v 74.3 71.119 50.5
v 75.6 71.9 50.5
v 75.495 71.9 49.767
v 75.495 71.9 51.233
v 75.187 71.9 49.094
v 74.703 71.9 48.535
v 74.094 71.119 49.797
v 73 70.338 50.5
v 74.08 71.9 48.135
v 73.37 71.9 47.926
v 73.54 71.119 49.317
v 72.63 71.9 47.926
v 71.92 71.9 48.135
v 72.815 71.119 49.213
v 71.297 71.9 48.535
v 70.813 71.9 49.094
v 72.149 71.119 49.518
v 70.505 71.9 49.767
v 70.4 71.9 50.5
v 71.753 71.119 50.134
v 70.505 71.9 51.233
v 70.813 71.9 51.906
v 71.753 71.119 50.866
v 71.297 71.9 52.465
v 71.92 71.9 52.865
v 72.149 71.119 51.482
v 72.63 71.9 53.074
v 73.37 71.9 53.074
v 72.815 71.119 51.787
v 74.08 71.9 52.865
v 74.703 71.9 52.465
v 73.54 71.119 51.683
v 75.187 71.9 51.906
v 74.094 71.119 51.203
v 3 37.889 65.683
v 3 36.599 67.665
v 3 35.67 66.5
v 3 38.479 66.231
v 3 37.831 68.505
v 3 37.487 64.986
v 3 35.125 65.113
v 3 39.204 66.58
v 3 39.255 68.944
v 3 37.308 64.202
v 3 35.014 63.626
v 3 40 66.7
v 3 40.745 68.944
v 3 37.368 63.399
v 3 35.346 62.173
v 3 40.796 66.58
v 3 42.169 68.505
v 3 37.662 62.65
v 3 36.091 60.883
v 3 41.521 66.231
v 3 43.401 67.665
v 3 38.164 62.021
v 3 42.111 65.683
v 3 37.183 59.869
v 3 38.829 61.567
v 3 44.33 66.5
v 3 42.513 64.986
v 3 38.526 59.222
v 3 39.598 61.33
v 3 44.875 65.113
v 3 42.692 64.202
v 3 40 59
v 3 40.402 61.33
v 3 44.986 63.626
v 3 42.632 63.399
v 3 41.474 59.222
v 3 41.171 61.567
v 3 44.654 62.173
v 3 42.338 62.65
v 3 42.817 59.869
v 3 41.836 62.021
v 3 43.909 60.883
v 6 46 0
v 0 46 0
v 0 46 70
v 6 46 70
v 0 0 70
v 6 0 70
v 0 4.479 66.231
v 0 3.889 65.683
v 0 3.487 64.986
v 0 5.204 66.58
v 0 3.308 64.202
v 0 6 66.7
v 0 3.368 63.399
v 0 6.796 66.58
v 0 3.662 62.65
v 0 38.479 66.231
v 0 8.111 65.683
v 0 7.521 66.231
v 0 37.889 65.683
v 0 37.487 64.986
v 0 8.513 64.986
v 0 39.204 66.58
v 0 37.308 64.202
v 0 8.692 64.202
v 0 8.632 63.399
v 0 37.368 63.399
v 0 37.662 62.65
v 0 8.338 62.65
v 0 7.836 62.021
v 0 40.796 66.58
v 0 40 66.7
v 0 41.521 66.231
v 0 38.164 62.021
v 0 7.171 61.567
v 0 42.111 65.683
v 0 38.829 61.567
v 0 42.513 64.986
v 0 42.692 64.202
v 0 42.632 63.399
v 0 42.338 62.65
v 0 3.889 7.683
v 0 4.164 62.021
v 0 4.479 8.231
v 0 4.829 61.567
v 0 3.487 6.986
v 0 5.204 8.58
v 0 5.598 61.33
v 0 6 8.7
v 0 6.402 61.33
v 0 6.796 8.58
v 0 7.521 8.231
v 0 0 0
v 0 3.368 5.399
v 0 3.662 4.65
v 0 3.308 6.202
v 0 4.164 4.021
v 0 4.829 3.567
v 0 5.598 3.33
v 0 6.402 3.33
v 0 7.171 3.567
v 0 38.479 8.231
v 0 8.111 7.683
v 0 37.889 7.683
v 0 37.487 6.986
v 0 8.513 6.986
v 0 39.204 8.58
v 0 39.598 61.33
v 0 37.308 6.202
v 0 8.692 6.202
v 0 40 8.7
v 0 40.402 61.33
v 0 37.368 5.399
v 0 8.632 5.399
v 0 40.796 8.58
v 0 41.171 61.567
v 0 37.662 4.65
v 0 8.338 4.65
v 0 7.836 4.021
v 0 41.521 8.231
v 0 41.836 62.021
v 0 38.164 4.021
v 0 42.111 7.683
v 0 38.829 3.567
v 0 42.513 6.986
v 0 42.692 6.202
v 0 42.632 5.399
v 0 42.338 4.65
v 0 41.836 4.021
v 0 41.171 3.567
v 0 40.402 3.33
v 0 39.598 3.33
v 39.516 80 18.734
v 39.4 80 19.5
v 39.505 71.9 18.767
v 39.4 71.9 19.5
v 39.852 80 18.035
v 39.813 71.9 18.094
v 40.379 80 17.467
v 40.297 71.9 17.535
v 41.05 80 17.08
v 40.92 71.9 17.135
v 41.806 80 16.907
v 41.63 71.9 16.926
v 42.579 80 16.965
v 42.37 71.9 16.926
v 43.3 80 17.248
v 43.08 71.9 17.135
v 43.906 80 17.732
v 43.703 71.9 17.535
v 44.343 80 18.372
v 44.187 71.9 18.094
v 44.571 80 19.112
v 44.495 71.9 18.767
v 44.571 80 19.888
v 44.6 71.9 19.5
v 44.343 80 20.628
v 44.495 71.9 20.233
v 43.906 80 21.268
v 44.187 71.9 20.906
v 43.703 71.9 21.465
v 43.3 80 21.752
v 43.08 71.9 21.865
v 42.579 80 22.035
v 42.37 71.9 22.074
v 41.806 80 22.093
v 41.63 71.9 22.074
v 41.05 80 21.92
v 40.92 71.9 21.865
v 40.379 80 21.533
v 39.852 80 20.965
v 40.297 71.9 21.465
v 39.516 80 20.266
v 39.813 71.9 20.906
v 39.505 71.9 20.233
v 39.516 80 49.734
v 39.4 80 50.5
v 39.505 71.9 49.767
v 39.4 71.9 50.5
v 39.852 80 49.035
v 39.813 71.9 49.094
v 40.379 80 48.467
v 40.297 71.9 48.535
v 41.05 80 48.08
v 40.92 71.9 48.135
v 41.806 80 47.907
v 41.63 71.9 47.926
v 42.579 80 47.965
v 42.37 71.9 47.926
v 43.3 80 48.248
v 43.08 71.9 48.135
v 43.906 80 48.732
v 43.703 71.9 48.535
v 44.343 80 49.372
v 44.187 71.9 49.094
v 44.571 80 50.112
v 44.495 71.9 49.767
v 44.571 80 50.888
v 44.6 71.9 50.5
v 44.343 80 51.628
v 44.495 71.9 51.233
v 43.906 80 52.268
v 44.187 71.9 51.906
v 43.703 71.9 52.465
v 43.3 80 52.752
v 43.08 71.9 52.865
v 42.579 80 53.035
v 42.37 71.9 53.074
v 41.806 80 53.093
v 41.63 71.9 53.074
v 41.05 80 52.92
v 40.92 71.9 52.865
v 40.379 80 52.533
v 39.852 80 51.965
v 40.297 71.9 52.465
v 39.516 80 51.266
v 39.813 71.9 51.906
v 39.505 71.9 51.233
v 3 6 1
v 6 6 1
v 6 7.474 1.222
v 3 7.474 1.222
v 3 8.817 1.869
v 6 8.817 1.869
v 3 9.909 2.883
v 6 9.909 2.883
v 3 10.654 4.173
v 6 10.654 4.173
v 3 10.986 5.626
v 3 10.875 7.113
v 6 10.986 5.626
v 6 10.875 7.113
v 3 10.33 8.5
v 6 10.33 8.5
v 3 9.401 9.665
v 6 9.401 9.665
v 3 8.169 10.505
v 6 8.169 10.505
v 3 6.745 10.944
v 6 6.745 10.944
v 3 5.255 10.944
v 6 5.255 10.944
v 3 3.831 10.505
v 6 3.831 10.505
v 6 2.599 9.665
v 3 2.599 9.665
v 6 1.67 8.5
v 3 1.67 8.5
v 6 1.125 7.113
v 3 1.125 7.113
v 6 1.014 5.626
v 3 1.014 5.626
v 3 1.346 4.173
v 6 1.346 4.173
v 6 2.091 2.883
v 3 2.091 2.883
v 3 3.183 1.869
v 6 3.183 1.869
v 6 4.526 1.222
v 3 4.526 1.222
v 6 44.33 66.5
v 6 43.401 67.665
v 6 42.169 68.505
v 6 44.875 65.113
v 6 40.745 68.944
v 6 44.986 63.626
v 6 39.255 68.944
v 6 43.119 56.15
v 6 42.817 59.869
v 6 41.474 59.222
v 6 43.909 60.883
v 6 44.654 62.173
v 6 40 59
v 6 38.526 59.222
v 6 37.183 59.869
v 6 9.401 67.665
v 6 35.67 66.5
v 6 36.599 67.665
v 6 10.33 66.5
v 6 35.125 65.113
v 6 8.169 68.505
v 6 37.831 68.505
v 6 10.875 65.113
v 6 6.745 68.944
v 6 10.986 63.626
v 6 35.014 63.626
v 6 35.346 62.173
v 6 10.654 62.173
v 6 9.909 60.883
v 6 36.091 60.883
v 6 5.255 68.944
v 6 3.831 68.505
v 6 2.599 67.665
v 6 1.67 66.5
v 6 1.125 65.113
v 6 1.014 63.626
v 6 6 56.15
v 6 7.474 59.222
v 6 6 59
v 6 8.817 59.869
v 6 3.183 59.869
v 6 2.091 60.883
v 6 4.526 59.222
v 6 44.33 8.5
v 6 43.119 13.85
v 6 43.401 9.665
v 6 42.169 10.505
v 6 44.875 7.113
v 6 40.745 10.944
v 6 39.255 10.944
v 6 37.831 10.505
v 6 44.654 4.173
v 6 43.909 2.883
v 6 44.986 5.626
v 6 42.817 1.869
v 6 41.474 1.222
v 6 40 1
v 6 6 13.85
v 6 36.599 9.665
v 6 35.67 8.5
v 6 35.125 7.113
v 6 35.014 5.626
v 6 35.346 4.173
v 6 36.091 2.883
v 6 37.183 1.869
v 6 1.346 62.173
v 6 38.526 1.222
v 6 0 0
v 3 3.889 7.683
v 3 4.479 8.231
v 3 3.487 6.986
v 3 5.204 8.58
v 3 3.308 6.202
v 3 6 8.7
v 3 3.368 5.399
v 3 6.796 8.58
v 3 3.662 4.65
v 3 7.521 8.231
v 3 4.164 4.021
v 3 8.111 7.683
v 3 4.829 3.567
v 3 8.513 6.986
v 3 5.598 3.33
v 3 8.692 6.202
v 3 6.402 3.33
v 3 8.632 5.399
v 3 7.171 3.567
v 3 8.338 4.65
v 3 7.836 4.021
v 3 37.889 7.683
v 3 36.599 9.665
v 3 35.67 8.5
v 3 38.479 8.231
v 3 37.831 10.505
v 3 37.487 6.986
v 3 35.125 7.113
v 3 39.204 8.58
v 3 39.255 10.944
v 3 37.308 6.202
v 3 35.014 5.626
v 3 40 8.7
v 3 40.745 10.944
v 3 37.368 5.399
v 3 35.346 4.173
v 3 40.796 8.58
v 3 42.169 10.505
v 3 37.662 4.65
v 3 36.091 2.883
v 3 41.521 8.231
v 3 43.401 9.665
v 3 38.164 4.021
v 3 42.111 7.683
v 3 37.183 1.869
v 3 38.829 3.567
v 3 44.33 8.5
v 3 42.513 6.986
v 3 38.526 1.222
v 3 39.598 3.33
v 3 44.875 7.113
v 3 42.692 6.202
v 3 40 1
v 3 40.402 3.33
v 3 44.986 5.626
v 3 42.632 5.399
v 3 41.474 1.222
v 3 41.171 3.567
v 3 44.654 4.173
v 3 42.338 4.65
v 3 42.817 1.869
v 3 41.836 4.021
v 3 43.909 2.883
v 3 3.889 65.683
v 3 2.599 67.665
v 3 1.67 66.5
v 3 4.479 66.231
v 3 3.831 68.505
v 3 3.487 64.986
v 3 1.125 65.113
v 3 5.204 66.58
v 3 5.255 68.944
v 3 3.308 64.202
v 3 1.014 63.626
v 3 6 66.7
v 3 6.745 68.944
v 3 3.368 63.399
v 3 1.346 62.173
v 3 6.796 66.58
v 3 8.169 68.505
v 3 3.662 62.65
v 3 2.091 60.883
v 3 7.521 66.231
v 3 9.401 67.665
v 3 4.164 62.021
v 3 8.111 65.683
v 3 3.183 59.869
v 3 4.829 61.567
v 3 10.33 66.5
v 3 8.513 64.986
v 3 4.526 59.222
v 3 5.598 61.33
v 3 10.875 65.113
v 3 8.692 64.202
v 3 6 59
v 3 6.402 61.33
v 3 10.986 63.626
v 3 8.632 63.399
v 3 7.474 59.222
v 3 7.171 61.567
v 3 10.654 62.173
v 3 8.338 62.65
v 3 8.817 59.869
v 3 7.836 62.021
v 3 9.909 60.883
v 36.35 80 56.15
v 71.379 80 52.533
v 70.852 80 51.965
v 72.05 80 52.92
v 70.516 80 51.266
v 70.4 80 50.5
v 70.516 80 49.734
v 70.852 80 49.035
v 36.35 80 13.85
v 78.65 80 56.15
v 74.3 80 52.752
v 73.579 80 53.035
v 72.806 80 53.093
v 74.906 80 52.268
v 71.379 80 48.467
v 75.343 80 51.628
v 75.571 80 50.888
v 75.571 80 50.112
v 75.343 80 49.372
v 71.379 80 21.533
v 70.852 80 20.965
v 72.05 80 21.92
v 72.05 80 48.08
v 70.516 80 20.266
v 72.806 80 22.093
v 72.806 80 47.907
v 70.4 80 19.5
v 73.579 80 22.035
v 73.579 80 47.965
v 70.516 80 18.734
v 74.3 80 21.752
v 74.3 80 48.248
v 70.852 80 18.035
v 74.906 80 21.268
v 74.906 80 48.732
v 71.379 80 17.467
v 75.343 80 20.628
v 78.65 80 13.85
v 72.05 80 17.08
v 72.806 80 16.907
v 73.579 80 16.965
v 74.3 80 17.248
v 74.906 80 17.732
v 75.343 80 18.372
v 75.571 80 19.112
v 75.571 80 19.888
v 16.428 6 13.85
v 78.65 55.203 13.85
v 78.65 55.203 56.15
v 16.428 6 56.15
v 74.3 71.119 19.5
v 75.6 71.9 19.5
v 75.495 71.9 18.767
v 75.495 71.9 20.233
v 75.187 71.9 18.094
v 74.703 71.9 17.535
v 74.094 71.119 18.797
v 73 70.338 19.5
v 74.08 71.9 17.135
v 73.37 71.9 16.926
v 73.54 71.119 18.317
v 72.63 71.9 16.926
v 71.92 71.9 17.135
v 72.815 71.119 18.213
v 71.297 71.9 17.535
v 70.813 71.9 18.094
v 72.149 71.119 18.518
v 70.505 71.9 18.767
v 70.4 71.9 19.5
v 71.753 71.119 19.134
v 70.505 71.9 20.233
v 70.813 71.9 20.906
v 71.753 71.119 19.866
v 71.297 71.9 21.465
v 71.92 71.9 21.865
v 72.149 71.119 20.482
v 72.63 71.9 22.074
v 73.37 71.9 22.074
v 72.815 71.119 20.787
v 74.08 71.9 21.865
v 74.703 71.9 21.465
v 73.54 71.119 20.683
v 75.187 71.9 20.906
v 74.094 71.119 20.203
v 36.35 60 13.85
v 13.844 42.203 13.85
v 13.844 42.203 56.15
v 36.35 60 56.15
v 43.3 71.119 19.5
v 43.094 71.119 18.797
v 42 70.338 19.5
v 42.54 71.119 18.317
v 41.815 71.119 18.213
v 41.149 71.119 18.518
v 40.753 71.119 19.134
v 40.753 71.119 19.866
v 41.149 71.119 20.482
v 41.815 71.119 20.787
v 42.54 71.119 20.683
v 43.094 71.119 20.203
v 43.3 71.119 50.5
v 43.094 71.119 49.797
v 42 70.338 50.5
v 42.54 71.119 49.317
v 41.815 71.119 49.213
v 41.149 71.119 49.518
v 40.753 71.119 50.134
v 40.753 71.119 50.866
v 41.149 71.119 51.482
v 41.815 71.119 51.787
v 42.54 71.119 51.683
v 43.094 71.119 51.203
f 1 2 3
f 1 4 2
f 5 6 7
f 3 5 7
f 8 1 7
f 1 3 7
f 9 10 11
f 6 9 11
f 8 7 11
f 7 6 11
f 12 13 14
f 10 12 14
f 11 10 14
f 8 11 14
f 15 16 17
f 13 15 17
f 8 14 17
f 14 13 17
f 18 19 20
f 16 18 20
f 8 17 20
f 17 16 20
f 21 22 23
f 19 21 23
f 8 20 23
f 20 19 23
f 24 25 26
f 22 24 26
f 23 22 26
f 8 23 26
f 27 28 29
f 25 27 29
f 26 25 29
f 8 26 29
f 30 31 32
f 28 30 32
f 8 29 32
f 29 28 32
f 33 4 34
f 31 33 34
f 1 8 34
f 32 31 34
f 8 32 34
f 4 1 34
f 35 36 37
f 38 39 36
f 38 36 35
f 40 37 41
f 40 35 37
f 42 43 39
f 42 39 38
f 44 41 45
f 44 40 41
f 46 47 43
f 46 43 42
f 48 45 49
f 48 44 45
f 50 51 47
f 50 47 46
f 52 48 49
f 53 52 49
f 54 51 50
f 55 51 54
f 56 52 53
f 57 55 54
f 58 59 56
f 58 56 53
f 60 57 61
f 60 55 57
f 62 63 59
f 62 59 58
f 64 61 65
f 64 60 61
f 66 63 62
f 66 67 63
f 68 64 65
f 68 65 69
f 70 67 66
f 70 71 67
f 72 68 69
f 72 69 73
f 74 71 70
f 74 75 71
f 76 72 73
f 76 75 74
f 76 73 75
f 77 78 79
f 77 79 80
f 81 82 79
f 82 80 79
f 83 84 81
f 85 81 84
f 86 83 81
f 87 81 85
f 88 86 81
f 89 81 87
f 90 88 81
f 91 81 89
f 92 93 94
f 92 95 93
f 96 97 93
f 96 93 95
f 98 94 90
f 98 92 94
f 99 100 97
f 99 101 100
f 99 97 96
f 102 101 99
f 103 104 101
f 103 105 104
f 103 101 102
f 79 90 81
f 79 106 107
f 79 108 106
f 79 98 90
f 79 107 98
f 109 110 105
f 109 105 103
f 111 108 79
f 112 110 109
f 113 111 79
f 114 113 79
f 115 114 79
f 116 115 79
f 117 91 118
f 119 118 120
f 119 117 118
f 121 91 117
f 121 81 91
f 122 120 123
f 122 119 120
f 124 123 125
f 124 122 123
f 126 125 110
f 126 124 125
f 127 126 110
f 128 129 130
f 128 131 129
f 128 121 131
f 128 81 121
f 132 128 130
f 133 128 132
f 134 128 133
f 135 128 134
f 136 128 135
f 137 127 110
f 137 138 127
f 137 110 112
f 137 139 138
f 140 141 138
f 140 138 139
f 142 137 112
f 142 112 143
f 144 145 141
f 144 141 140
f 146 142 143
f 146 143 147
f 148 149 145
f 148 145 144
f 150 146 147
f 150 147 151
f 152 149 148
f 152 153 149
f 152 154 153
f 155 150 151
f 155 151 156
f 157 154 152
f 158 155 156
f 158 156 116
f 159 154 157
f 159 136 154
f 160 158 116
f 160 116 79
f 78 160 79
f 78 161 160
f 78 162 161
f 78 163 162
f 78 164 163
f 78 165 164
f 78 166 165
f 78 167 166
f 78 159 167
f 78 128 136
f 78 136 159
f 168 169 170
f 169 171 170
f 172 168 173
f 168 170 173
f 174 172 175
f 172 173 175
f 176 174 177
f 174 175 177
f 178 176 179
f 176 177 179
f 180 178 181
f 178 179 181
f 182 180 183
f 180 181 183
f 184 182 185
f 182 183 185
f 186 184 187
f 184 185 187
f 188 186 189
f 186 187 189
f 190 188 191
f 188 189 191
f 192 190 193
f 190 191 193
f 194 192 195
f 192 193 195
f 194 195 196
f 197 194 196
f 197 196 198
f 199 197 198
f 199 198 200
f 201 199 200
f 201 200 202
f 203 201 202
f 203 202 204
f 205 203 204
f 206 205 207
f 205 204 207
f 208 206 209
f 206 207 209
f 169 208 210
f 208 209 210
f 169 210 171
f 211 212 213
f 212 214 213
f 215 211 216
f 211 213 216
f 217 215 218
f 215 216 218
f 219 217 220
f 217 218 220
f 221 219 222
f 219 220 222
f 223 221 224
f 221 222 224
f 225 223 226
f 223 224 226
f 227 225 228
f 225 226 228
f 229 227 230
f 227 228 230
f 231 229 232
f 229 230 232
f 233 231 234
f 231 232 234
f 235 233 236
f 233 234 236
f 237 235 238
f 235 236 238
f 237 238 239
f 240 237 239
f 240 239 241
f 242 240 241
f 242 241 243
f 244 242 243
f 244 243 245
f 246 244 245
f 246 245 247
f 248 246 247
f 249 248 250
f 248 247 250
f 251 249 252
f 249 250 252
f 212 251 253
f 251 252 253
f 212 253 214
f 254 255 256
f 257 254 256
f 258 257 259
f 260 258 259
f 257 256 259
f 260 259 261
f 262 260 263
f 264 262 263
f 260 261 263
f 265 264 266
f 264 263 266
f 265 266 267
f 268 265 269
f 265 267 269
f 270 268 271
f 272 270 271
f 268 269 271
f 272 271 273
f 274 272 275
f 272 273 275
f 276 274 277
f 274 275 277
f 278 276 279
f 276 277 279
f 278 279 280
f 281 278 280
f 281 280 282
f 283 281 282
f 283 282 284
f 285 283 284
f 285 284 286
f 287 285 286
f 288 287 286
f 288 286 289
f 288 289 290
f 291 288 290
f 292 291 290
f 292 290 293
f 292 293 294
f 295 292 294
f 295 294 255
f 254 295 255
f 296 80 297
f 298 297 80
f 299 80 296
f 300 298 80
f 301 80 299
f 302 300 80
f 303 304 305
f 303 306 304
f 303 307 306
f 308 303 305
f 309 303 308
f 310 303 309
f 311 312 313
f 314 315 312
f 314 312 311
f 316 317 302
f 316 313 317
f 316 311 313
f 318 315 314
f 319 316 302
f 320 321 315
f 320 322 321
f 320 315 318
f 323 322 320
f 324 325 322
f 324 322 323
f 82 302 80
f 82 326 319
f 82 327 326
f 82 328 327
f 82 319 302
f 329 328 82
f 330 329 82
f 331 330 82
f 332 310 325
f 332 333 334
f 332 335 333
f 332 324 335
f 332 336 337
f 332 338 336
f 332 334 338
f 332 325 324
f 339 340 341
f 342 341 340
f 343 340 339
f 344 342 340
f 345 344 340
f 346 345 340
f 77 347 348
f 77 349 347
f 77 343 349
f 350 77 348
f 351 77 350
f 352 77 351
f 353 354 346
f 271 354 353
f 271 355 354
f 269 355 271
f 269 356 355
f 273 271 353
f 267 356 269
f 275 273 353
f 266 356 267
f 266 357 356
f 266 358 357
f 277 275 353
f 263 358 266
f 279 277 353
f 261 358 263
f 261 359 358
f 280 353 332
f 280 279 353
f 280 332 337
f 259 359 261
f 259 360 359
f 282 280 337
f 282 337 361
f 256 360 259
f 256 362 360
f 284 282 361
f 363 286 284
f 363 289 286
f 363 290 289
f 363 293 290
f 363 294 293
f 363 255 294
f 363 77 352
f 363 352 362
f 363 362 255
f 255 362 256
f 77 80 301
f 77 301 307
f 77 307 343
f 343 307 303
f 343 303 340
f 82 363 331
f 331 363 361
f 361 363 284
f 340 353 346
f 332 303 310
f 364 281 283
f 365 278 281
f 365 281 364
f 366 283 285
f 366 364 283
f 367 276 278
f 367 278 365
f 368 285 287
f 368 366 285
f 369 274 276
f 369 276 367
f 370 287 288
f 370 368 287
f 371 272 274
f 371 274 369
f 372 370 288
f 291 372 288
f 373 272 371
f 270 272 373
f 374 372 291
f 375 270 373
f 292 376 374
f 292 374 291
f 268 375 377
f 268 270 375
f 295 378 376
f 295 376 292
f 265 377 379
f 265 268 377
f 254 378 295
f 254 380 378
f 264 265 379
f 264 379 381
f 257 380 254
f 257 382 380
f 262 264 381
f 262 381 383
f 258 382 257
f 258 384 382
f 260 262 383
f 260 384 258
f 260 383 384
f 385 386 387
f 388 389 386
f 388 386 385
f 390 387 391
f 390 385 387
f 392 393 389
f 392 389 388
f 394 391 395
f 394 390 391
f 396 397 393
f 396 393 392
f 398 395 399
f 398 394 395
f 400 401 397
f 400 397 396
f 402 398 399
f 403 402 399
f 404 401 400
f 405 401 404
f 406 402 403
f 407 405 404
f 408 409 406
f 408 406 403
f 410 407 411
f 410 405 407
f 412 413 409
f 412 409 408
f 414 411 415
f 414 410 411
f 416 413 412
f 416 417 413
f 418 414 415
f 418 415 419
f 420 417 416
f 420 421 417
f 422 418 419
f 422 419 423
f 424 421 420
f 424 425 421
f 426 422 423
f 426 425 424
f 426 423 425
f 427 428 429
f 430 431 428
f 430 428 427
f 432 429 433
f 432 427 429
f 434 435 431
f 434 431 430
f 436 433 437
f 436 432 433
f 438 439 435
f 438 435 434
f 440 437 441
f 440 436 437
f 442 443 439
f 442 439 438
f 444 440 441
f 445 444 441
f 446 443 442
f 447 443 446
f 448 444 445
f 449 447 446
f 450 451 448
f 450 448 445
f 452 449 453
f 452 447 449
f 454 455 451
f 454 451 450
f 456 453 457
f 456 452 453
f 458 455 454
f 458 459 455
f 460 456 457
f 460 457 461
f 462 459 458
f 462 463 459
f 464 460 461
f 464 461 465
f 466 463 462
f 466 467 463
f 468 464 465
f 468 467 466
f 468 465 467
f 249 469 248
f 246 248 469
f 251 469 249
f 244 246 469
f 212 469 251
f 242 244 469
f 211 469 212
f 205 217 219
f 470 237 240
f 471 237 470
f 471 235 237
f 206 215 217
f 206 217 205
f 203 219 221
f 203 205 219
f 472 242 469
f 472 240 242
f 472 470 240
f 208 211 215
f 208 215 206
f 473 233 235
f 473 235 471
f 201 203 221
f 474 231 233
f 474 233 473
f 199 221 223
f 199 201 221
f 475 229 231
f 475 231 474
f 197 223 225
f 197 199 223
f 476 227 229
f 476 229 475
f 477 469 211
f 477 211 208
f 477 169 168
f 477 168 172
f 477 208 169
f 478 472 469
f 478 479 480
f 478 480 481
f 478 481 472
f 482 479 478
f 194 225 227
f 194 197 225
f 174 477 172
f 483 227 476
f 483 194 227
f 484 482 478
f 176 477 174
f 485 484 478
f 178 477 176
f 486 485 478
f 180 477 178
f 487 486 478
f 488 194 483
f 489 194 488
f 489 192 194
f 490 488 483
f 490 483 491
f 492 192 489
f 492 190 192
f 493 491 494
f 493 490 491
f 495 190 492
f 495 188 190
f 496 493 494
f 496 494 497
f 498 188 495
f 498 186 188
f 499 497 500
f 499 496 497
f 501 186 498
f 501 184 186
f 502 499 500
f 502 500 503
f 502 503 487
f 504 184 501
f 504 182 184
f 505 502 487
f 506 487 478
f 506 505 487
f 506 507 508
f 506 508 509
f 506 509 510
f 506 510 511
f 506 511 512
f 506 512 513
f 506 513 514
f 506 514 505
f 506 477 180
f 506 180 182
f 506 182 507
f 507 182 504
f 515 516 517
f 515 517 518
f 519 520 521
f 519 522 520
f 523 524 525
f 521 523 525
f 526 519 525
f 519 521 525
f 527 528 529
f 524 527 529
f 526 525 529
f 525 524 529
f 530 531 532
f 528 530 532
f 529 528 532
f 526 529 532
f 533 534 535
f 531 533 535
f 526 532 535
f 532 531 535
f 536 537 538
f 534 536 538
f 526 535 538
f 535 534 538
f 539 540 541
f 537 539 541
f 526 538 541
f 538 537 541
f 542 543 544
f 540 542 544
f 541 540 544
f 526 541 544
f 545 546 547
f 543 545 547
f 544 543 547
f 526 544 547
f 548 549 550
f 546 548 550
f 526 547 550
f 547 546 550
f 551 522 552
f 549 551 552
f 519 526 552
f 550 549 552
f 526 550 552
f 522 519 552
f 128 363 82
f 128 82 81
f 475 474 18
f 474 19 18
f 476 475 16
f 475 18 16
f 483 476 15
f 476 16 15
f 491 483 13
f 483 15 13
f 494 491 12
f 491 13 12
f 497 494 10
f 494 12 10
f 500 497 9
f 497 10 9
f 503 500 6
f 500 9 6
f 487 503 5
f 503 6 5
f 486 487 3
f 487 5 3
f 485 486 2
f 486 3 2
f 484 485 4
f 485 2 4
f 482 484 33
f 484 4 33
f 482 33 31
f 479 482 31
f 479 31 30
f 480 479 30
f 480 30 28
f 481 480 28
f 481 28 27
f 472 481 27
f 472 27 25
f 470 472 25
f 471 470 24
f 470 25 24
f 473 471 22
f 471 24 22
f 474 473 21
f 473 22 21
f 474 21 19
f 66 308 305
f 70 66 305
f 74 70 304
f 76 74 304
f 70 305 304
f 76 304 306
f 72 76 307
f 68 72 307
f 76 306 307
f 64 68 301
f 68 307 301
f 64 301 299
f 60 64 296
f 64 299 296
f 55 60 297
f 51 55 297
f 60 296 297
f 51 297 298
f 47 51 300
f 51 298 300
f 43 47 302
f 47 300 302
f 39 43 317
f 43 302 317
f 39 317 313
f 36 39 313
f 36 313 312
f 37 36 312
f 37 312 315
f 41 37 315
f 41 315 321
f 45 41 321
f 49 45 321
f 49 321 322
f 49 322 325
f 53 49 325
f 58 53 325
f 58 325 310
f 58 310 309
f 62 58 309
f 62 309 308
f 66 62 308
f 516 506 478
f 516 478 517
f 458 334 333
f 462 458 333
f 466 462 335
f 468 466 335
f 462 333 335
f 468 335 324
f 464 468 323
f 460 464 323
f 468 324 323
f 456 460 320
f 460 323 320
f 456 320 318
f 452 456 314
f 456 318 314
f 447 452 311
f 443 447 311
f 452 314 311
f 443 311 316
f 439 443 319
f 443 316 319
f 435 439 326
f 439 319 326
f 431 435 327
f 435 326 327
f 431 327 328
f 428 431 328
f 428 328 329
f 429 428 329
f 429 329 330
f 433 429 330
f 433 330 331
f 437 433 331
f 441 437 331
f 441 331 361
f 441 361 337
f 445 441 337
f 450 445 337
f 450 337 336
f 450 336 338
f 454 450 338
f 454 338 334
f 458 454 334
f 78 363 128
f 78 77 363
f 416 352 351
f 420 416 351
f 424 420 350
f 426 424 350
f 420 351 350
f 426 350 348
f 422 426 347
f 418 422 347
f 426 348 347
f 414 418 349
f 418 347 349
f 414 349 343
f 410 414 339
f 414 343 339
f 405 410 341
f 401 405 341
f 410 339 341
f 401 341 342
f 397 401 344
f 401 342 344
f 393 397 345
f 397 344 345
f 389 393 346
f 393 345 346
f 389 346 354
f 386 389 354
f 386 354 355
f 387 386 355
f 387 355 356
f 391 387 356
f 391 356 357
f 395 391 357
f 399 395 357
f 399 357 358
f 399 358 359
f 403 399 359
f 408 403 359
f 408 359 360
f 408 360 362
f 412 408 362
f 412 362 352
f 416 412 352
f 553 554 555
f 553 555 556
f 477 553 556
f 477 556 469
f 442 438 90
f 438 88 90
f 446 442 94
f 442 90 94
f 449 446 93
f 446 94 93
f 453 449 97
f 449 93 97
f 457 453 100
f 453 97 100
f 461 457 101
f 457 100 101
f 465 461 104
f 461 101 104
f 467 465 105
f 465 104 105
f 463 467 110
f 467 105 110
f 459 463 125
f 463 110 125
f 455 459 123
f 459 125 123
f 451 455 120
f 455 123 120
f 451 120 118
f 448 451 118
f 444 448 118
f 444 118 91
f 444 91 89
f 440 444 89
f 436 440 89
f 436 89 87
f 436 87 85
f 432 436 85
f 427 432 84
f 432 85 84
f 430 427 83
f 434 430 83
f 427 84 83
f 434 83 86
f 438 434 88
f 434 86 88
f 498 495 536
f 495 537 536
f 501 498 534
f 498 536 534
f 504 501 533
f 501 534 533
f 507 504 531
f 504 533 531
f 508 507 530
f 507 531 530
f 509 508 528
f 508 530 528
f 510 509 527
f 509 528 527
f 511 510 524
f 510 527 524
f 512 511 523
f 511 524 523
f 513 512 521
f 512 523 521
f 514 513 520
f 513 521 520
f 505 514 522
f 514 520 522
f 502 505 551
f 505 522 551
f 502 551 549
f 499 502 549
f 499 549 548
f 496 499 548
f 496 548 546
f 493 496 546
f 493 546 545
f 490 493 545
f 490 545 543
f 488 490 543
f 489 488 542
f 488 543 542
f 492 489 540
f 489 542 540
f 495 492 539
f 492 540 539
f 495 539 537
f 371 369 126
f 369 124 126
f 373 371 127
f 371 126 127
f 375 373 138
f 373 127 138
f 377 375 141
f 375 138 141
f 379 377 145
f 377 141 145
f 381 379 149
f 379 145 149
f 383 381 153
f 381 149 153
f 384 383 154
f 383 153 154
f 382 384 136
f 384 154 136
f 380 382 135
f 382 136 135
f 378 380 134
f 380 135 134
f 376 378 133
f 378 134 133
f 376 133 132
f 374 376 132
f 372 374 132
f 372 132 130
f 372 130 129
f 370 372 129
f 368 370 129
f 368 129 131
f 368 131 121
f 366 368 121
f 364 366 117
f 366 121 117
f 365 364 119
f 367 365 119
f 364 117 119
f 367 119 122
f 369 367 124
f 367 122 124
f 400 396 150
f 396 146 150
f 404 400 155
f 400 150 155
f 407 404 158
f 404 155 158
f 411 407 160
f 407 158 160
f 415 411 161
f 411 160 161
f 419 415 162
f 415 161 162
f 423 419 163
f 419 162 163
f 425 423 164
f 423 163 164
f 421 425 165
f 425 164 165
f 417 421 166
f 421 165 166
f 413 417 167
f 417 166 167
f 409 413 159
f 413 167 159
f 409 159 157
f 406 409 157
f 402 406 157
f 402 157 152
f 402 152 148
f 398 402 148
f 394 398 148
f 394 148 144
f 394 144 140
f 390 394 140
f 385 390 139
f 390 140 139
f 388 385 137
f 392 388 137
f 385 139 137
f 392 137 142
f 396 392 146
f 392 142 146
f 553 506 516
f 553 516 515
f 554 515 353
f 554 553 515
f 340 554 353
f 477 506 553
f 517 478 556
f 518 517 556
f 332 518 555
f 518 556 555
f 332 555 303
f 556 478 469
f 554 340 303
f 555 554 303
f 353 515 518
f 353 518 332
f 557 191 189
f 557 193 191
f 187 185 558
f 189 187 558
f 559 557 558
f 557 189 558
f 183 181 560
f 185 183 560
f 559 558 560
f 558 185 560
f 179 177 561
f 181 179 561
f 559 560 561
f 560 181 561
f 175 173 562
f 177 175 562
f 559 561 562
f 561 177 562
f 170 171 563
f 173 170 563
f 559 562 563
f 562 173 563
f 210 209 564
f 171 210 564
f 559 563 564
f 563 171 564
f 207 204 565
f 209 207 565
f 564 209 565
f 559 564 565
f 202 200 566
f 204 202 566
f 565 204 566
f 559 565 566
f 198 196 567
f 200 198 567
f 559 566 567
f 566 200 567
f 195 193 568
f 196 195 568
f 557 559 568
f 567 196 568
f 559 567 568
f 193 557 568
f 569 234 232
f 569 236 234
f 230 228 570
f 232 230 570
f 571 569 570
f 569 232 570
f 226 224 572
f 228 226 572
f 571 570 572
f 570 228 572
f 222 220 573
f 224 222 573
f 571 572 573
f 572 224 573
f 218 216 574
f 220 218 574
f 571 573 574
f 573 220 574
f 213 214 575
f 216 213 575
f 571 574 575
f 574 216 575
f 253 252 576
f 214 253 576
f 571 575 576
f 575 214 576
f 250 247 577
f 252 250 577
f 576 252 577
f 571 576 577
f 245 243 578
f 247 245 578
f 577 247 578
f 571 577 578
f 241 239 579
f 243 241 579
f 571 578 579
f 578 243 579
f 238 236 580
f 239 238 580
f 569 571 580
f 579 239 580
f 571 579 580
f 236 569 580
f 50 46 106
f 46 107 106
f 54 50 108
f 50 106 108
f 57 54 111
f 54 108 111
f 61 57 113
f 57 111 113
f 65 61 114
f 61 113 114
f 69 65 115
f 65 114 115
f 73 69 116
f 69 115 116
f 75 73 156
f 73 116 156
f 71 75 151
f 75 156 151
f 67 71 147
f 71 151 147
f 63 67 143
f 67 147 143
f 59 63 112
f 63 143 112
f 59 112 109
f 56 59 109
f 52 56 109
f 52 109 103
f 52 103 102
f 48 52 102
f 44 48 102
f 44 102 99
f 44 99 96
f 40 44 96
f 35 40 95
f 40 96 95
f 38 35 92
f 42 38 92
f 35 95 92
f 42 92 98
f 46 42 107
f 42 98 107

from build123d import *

# Parameters (mm, degrees)
ESTRUSIONE_ESTRUSIONE1_DEPTH                         = 70
TAGLIO_ESTRUSIONE2_DEPTH                             = 133.233968783
TAGLIO_ESTRUSIONE2_DEPTH_BACK                        = 13.85
TAGLIO_ESTRUSIONE3_DEPTH                             = 13.85
FORO_LAMATO_PER_BULLONE_M12_A_TESTA_ESAG_D           = 5.4
FORO_LAMATO_PER_BULLONE_M12_A_TESTA_ESAG_DEPTH       = 18.1
FORO_LAMATO_PER_BULLONE_M12_A_TESTA_ESAG_CBORE_D     = 10
FORO_LAMATO_PER_BULLONE_M12_A_TESTA_ESAG_CBORE_DEPTH = 3
FORO_LAMATO_PER_BULLONE_M12_A_TESTA_ESAG_TIP         = 1.622323671
SMUSSO1_SIZE                                         = 10
SMUSSO1_SIZE2                                        = 7.11916601
FORO_PER_VITE_M4_1_D                                 = 5.2
FORO_PER_VITE_M4_1_DEPTH                             = 8.1
FORO_PER_VITE_M4_1_TIP                               = 1.562237609


with BuildPart() as part:
    # Schizzo1 → Estrusione-Estrusione1 (new body)
    with BuildSketch(Plane.XY):
        Polygon((0, 0), (0, 46), (6, 46), (6, 36), (36.35, 60), (36.35, 80), (78.65, 80), (78.65, 55.203294303), (16.42833408, 6), (6, 6), (6, 0), align=None)
    extrude(amount=ESTRUSIONE_ESTRUSIONE1_DEPTH)

    # Schizzo3 → Taglio-Estrusione2 (cut, two sides: drawn at the far end of the back side and taken through both)
    with BuildSketch(Plane.XY.offset(70).offset(-TAGLIO_ESTRUSIONE2_DEPTH_BACK)):
        Polygon((6, 6), (6, 36), (36.35, 60), (36.35, 80), (78.65, 80), (78.65, 55.203294303), (16.42833408, 6), align=None)
    extrude(amount=TAGLIO_ESTRUSIONE2_DEPTH + TAGLIO_ESTRUSIONE2_DEPTH_BACK, mode=Mode.SUBTRACT)

    # Schizzo4 → Taglio-Estrusione3 (cut)
    with BuildSketch(Plane(origin=(0, 0, 0), x_dir=(-1, 0, 0), z_dir=(0, 0, -1))):
        Polygon((-36.35, 60), (-36.35, 80), (-78.65, 80), (-78.65, 55.203294303), (-16.42833408, 6), (-6, 6), (-6, 36), align=None)
    extrude(amount=-TAGLIO_ESTRUSIONE3_DEPTH, mode=Mode.SUBTRACT)

    # Foro lamato per Bullone M12 a testa esagonale (Classe superiore)-1
    with Locations(Plane(origin=(6, 0, 0), x_dir=(0, 0, -1), z_dir=(1, 0, 0))):
        with Locations((-64, 6), (-6, 6), (-6, 40), (-64, 40)):
            CounterBoreHole(FORO_LAMATO_PER_BULLONE_M12_A_TESTA_ESAG_D / 2, FORO_LAMATO_PER_BULLONE_M12_A_TESTA_ESAG_CBORE_D / 2, FORO_LAMATO_PER_BULLONE_M12_A_TESTA_ESAG_CBORE_DEPTH, depth=FORO_LAMATO_PER_BULLONE_M12_A_TESTA_ESAG_DEPTH)
            with Locations((0, 0, -(FORO_LAMATO_PER_BULLONE_M12_A_TESTA_ESAG_DEPTH + FORO_LAMATO_PER_BULLONE_M12_A_TESTA_ESAG_TIP / 2))):  # 118° drill point
                Cone(0, FORO_LAMATO_PER_BULLONE_M12_A_TESTA_ESAG_D / 2, FORO_LAMATO_PER_BULLONE_M12_A_TESTA_ESAG_TIP, mode=Mode.SUBTRACT)

    # Smusso1
    smusso1_edges = [part.edges().sort_by_distance(p)[0] for p in [
        (6, 36, 35),
    ]]
    smusso1_side = [part.faces().sort_by_distance(p)[0] for p in [
        (21.175, 48, 35),
    ]]
    chamfer(smusso1_edges, length=SMUSSO1_SIZE, length2=SMUSSO1_SIZE2, reference=smusso1_side[0])

    # Foro per Vite M4-1
    with Locations(Plane(origin=(0, 80, 0), x_dir=(1, 0, 0), z_dir=(0, 1, 0))):
        with Locations((42, -19.5), (73, -19.5), (73, -50.5), (42, -50.5)):
            Hole(FORO_PER_VITE_M4_1_D / 2, depth=FORO_PER_VITE_M4_1_DEPTH)
            with Locations((0, 0, -(FORO_PER_VITE_M4_1_DEPTH + FORO_PER_VITE_M4_1_TIP / 2))):  # 118° drill point
                Cone(0, FORO_PER_VITE_M4_1_D / 2, FORO_PER_VITE_M4_1_TIP, mode=Mode.SUBTRACT)


solid = part.part
